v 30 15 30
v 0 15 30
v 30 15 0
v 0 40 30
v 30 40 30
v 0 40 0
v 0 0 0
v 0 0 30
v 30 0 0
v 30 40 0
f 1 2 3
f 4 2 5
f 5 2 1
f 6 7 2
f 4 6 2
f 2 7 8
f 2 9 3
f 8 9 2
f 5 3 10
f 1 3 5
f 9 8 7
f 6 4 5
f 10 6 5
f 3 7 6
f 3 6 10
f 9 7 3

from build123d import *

# Parameters (mm, degrees)
F1_DEPTH = 15
F3_W     = 30
F3_H     = 30
F4_DEPTH = 25


with BuildPart() as f1:
    # F0 (on Front) → F1 (new body)
    with BuildSketch(Plane.XZ):
        Polygon((0, 30), (0, 0), (30, 0), align=None)
    extrude(amount=-F1_DEPTH)

    # F3 (on offset) → F4 (join)
    with BuildSketch(Plane.XZ.offset(-15)):
        with Locations((15, 15)):
            Rectangle(F3_W, F3_H)
    extrude(amount=-F4_DEPTH)


solid = f1.part
